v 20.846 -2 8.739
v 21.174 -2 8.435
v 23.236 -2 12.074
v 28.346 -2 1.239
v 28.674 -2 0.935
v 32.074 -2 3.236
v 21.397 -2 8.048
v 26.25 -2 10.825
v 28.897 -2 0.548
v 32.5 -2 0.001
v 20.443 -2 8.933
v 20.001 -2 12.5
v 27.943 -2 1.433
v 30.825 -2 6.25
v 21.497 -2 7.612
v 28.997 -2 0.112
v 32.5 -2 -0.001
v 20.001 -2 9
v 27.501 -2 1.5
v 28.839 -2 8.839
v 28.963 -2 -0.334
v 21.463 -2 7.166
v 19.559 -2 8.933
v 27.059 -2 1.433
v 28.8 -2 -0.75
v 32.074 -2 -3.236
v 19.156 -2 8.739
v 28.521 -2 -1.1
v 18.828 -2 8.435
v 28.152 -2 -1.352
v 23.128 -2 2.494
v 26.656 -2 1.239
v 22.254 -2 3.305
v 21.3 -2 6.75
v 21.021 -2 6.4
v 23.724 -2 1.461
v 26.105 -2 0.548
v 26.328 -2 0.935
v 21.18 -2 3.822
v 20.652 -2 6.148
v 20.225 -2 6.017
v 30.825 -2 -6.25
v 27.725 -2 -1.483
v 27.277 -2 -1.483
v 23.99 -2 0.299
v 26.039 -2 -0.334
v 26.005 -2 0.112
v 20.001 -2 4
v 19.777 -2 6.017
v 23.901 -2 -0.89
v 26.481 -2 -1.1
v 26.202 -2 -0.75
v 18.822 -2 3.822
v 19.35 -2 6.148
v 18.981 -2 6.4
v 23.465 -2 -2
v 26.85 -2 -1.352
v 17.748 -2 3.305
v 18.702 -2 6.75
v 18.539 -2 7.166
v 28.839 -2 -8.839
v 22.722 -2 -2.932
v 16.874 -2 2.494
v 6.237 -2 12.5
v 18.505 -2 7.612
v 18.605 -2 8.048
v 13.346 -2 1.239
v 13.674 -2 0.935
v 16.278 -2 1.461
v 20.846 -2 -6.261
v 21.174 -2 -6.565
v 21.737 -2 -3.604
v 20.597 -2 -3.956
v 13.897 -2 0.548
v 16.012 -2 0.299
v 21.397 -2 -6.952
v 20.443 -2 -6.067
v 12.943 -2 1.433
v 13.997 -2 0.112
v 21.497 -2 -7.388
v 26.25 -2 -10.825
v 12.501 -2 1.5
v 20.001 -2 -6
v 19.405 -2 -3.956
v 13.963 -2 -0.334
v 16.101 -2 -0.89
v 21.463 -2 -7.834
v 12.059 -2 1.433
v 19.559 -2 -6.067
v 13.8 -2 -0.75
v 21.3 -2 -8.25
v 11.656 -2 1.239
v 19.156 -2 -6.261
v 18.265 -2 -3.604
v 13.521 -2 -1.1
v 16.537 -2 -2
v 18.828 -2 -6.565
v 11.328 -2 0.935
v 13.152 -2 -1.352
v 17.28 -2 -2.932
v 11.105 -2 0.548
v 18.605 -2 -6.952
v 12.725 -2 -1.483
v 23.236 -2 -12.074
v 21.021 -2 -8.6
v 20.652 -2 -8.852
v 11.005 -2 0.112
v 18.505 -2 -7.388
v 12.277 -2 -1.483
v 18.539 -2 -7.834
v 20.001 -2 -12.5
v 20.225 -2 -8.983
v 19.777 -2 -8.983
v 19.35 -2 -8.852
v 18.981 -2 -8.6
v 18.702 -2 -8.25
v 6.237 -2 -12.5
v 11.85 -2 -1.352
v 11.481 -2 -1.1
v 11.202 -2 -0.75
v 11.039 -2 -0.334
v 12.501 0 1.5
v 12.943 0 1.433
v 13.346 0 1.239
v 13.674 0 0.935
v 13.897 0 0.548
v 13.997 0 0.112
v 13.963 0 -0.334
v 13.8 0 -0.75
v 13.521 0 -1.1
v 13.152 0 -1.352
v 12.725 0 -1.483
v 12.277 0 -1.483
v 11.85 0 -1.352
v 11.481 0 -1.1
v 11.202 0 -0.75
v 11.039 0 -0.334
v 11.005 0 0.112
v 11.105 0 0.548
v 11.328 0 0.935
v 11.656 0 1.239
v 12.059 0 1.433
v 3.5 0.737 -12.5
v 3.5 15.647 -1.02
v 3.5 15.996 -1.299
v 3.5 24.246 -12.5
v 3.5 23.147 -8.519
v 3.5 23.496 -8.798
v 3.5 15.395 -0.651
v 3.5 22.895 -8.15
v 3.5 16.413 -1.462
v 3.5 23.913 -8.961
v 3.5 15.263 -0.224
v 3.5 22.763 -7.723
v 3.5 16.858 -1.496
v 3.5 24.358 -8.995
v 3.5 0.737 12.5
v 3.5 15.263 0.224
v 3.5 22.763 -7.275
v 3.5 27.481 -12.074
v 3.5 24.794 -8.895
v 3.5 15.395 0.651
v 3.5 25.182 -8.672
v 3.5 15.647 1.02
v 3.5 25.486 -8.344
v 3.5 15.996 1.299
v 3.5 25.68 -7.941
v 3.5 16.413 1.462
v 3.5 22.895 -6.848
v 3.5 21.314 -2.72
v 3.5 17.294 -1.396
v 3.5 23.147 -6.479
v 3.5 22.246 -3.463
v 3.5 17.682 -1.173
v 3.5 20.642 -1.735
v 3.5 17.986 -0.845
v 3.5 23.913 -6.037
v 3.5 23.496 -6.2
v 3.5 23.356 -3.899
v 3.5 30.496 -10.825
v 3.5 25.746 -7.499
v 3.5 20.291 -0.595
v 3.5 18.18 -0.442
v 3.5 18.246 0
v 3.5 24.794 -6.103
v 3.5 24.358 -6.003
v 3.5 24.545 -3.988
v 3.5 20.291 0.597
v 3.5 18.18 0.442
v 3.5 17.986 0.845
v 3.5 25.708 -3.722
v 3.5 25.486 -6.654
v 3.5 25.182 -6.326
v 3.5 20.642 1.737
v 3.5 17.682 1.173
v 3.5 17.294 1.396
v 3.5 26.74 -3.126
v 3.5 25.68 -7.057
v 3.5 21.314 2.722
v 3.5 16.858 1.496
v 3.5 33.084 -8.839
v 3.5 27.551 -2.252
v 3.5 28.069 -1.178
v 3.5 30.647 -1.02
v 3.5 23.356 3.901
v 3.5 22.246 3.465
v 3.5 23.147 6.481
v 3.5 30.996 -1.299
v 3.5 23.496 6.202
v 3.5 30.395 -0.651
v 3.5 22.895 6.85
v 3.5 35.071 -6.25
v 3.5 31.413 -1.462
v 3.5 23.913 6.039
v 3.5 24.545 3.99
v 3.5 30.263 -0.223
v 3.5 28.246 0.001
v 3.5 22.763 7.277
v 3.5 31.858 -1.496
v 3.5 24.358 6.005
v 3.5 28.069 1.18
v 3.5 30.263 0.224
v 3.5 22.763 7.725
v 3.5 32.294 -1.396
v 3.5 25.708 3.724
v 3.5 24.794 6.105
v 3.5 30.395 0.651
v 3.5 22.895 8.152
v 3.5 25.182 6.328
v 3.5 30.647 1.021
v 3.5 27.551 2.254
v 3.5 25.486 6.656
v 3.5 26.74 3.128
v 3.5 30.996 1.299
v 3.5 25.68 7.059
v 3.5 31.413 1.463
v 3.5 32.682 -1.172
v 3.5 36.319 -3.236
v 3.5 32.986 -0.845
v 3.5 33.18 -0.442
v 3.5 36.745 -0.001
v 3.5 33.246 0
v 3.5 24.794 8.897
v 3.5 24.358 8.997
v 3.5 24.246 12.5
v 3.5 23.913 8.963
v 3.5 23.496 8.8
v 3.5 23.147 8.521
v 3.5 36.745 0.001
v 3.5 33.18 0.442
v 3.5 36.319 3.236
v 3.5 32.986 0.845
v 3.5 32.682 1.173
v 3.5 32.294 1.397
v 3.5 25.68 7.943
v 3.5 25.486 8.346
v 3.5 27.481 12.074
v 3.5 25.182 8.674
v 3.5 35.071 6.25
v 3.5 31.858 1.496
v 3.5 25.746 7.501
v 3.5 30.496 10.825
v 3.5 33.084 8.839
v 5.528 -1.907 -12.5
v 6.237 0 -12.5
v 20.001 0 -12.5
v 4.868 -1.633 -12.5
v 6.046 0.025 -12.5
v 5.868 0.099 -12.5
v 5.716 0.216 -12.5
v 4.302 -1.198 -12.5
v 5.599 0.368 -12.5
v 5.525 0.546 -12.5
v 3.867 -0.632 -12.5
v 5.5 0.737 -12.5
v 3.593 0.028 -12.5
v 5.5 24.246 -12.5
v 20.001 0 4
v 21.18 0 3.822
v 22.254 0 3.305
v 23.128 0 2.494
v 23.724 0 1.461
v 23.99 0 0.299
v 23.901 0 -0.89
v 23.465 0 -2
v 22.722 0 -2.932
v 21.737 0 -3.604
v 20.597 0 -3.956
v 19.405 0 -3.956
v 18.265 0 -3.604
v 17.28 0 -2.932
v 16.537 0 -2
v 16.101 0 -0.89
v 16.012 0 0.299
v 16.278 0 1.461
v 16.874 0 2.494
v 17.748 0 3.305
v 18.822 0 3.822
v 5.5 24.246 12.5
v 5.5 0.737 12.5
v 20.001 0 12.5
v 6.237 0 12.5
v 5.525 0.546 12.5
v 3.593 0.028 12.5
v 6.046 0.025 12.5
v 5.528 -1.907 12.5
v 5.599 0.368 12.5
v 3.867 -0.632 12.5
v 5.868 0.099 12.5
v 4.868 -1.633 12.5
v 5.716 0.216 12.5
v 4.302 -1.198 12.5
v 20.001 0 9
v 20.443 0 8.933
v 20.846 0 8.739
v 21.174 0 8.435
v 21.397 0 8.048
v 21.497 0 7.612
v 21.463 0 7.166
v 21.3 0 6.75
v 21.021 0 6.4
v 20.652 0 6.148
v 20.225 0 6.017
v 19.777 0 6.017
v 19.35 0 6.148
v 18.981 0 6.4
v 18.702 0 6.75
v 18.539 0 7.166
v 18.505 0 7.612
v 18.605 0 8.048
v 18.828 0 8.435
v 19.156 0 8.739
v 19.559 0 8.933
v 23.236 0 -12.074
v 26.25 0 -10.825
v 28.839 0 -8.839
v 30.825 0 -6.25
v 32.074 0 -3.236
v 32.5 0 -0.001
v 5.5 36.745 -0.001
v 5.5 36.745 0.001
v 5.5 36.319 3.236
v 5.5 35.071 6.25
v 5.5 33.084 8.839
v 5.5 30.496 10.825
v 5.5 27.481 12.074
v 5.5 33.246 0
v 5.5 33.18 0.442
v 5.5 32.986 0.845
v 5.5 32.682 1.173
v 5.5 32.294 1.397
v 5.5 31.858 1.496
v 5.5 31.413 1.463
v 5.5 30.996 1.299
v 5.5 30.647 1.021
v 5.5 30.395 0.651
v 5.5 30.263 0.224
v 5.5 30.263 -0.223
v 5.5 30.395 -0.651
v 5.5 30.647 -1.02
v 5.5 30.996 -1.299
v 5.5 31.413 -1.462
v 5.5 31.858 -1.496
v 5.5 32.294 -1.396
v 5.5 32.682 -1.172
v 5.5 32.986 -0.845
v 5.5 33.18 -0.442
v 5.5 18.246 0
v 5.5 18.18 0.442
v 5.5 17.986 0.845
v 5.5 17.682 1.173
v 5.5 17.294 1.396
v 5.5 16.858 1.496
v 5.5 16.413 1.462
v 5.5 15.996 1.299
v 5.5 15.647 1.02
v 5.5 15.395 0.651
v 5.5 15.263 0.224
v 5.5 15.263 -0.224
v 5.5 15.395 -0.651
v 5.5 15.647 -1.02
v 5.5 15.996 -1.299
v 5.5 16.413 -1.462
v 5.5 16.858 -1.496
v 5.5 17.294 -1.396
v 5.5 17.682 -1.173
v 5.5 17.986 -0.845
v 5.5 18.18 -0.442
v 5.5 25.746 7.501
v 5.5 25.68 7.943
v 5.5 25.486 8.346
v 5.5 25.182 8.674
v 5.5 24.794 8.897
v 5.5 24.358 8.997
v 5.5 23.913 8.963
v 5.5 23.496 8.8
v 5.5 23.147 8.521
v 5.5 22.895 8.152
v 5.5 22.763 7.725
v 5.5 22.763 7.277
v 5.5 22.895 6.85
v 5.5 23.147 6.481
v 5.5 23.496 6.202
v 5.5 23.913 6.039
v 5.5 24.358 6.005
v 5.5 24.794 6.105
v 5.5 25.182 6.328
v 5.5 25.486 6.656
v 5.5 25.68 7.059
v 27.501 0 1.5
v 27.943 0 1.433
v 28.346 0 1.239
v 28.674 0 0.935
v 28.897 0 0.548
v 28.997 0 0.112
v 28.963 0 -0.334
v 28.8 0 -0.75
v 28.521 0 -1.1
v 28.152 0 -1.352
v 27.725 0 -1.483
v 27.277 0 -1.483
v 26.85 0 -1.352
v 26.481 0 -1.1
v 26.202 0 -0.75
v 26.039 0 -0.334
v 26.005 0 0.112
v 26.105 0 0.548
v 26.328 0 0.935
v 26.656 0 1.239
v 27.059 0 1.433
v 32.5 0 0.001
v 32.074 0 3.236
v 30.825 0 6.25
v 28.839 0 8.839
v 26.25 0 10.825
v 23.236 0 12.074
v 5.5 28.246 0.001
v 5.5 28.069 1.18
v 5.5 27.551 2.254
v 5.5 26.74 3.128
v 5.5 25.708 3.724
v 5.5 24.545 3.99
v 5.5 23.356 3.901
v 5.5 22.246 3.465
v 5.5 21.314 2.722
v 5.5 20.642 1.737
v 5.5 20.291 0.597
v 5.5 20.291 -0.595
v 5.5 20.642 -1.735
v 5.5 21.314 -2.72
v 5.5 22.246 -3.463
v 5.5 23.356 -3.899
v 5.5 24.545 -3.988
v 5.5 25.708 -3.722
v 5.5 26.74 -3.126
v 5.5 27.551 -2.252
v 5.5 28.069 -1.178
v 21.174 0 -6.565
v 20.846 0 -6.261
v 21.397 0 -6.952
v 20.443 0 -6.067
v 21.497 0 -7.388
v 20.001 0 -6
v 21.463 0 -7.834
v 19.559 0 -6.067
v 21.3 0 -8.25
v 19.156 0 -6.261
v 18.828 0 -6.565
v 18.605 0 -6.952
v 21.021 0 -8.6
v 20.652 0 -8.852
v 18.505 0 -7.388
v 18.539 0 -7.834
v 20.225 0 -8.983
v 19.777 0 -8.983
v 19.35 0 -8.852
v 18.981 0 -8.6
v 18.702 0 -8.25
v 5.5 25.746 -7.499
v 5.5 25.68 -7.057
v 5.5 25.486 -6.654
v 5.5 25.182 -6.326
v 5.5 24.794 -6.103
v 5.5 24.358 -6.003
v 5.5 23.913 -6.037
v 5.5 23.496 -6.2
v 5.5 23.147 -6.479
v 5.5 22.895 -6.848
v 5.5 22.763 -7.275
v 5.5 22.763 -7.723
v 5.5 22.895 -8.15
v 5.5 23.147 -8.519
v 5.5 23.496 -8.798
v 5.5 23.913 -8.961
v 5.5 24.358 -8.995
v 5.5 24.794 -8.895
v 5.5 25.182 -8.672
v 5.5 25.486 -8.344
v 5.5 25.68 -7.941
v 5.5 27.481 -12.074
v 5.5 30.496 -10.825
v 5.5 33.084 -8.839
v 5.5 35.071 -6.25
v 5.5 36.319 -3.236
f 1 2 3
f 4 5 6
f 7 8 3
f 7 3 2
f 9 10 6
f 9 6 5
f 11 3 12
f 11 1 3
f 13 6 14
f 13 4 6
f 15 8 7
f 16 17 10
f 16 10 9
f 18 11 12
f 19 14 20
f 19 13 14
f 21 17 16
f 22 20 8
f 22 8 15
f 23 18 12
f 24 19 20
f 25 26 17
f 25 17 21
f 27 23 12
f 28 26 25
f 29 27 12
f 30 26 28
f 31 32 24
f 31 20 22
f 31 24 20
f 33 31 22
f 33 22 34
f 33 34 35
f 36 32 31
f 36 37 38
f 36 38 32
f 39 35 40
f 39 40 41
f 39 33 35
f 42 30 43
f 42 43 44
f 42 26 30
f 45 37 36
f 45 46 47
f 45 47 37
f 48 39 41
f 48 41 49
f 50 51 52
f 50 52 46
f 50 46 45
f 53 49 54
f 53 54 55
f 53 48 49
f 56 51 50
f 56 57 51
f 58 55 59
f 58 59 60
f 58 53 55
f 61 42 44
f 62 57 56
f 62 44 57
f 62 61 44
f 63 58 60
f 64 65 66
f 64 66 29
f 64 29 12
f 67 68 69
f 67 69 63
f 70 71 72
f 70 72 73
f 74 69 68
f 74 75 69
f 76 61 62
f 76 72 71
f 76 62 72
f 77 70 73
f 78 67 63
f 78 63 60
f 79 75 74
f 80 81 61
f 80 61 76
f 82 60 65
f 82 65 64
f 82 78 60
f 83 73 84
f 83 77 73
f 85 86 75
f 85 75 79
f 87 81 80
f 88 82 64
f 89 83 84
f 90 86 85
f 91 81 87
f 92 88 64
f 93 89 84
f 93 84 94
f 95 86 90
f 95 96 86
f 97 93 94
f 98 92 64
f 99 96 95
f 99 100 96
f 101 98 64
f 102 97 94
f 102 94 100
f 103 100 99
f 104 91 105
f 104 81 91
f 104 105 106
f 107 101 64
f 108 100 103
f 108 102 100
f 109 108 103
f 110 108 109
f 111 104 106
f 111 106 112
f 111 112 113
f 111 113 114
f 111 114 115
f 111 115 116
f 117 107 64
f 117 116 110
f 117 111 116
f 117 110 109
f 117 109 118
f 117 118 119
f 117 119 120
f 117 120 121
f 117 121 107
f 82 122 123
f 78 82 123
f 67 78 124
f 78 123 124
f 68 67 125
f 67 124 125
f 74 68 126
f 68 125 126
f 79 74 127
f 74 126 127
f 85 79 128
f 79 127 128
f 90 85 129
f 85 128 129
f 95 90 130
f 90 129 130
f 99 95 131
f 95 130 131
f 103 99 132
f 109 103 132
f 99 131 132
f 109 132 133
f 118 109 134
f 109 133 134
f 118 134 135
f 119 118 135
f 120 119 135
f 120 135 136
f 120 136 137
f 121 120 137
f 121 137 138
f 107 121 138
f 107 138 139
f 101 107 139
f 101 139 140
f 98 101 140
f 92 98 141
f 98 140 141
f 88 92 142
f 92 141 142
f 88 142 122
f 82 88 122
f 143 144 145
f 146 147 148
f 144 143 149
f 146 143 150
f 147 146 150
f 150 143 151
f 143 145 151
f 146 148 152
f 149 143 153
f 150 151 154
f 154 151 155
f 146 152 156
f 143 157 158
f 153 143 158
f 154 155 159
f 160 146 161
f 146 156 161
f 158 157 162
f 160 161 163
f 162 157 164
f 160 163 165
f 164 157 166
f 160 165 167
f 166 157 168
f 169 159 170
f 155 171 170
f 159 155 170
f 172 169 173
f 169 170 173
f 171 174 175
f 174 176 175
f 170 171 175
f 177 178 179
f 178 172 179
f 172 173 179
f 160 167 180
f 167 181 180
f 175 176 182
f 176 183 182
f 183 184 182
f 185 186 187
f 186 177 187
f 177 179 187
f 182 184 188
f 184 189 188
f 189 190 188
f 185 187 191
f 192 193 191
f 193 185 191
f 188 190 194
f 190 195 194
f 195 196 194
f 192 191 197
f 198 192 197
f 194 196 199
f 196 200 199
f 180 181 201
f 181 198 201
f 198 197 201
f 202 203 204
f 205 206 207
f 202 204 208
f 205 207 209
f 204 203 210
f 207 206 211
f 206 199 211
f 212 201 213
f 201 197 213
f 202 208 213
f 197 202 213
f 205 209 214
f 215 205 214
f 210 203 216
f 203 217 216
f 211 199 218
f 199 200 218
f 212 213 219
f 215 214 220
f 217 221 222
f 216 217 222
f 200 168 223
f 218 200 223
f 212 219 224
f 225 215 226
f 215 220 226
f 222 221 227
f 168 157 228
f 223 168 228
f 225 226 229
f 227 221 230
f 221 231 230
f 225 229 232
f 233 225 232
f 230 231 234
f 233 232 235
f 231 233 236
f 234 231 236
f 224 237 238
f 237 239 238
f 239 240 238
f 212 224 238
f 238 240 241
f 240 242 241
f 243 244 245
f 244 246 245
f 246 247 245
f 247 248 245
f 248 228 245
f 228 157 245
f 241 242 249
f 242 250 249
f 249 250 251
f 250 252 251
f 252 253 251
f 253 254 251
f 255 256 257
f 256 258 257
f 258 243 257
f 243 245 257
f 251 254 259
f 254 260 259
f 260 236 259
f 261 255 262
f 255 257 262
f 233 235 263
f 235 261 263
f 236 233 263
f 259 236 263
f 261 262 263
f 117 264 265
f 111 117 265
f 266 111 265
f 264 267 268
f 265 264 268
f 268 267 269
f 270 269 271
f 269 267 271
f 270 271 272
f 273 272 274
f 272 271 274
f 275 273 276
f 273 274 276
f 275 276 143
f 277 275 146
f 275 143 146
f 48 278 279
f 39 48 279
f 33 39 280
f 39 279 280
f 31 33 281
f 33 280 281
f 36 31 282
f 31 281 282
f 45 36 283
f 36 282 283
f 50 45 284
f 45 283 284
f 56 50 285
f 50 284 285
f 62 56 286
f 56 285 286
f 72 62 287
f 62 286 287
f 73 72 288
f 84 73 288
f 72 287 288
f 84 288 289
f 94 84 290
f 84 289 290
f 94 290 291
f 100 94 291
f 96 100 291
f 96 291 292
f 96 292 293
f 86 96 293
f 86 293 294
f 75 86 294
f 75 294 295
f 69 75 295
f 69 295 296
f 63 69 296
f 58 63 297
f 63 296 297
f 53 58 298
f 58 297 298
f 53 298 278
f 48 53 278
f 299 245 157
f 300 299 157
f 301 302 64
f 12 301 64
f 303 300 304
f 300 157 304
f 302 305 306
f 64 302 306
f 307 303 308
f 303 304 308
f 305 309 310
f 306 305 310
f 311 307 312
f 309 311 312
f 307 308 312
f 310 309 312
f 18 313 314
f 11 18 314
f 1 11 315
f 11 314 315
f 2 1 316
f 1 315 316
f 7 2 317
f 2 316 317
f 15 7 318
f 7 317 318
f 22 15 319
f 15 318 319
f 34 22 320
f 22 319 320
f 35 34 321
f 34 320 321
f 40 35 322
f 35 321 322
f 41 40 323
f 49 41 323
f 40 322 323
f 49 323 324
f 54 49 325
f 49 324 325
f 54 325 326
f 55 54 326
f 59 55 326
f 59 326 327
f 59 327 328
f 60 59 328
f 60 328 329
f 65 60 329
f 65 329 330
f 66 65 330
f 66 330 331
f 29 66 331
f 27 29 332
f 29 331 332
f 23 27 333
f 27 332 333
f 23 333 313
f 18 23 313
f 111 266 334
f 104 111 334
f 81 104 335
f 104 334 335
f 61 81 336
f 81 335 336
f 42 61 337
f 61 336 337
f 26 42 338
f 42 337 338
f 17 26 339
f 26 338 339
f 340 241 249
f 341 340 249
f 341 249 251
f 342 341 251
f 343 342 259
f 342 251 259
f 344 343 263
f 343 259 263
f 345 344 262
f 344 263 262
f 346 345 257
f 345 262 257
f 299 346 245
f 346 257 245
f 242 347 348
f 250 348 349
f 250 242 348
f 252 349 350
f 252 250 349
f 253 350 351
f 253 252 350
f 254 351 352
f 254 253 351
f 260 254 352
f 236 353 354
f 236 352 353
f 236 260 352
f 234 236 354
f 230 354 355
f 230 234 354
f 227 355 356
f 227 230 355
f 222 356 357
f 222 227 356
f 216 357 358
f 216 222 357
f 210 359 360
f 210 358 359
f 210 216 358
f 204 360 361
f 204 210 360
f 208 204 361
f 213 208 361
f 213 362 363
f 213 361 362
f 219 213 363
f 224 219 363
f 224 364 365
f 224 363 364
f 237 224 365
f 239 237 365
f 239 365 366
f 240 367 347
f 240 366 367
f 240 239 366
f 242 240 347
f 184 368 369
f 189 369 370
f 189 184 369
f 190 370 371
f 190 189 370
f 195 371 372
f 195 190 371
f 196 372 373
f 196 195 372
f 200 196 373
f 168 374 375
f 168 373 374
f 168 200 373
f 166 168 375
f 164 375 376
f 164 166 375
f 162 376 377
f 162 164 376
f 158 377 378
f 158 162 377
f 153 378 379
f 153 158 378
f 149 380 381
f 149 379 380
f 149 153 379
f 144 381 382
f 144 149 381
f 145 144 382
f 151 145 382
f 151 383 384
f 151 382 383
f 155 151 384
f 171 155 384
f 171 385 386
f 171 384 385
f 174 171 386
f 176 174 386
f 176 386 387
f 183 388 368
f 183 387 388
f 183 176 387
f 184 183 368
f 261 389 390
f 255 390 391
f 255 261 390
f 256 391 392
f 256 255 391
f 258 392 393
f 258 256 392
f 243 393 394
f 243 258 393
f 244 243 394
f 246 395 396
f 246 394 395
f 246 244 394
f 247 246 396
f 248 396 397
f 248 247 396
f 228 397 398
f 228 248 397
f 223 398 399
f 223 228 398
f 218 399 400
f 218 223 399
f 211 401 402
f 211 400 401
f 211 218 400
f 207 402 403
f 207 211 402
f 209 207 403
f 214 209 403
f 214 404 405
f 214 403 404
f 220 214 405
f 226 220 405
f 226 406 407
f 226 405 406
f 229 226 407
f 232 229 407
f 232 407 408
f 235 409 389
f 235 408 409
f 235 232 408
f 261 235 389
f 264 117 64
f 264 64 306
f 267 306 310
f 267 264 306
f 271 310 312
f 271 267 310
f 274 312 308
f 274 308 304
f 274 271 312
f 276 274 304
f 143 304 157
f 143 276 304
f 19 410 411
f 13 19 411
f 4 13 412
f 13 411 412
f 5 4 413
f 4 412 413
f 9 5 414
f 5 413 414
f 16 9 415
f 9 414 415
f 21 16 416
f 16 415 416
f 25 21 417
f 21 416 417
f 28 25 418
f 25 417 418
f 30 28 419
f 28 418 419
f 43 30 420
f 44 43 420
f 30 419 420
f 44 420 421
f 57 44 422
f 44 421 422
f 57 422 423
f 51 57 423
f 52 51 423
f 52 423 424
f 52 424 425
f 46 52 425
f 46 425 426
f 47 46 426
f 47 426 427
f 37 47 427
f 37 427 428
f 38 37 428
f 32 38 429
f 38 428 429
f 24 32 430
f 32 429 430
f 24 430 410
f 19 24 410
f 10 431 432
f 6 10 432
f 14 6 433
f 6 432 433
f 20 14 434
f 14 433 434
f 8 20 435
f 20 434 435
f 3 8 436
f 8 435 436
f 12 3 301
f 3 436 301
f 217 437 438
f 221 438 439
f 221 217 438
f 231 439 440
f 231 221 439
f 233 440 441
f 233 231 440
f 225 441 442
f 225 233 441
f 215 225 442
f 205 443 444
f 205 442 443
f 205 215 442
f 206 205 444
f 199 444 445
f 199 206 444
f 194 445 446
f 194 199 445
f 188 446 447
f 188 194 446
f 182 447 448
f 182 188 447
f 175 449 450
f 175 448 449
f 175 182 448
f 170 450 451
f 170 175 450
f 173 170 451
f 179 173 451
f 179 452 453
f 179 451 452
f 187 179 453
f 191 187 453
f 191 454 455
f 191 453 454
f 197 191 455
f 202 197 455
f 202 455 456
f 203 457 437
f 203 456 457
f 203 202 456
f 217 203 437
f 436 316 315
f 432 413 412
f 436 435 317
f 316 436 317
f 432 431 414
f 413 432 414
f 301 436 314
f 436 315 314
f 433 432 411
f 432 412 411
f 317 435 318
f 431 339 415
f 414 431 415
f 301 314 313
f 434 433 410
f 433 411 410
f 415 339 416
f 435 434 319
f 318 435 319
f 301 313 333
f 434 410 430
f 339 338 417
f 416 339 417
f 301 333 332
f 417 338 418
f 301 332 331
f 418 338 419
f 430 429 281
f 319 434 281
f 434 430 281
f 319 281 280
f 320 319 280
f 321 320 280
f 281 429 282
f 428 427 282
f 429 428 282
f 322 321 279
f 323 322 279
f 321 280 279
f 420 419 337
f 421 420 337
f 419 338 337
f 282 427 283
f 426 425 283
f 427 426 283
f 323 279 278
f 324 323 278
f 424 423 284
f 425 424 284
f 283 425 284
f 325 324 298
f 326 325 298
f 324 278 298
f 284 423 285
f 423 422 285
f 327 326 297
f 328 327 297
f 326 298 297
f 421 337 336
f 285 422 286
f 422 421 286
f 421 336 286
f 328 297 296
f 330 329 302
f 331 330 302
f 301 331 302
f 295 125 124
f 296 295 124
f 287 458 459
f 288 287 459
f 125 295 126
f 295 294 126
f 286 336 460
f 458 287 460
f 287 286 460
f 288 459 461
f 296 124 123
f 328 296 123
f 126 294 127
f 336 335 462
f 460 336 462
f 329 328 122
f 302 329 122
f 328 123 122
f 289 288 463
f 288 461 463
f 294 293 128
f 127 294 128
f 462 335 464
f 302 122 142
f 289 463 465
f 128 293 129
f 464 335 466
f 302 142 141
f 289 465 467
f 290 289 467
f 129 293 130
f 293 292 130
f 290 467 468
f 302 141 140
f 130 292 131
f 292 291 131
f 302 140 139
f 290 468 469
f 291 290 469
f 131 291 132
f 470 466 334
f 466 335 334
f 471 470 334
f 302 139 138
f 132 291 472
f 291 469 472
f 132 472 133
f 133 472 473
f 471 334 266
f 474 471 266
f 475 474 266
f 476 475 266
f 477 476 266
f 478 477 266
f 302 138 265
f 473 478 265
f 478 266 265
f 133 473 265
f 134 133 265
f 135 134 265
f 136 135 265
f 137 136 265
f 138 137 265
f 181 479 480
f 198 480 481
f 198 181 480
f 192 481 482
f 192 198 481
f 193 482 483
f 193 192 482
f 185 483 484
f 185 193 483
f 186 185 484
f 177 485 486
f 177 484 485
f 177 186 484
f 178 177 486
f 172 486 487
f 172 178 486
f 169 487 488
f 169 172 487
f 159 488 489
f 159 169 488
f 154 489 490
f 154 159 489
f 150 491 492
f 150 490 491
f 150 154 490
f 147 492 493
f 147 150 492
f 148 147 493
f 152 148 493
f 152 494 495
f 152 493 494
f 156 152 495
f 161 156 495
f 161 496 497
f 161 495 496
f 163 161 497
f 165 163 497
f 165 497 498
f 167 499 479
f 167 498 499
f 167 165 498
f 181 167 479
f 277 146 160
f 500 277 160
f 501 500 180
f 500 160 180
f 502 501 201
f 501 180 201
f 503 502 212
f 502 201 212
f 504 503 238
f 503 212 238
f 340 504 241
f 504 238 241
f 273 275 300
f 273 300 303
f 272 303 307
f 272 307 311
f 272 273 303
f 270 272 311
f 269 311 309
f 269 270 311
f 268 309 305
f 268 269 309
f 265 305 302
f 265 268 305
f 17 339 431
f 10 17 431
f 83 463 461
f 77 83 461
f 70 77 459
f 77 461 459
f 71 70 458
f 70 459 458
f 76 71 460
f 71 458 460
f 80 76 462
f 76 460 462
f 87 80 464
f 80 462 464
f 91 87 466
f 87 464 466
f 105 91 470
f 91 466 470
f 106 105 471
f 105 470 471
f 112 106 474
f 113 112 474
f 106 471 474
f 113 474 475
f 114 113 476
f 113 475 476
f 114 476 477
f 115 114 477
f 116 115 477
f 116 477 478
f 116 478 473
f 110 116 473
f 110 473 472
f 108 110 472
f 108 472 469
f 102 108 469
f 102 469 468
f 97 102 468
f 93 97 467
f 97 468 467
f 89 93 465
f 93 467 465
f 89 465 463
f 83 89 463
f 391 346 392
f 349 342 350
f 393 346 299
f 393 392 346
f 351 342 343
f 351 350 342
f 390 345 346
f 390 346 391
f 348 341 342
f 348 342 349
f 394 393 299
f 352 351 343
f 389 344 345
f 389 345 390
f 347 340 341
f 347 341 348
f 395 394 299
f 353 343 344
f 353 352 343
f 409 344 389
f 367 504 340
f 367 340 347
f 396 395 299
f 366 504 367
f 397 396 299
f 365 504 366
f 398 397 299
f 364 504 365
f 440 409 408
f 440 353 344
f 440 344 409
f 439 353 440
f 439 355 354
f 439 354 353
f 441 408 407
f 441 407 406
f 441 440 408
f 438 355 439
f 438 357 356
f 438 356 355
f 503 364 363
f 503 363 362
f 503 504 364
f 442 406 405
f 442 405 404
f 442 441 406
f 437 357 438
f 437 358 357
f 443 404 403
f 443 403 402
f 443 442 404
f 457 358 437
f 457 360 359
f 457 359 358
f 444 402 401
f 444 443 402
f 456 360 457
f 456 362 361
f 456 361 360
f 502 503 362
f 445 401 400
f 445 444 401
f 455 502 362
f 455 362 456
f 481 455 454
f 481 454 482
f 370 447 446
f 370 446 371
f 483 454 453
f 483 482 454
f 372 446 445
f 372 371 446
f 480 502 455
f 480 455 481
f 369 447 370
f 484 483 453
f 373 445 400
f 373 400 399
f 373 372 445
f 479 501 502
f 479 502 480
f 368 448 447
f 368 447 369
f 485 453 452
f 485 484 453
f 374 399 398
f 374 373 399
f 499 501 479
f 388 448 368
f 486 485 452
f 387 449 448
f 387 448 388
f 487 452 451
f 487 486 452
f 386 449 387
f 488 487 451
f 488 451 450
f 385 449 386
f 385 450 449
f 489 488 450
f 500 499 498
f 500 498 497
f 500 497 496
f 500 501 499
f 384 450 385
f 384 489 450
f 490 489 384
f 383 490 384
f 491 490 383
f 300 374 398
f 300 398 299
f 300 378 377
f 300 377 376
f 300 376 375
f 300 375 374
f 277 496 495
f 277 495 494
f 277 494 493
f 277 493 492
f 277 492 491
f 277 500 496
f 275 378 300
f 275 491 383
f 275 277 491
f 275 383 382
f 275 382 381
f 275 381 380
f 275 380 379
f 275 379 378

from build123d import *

# Parameters (mm, degrees)
SKETCH1_R                    = 1.5
SKETCH1_R_2                  = 4
BASE_FLANGE1_DEPTH           = 2
SKETCHED_START               = -32.5
SKETCHED_BEND1_OUTLINE_W     = 2
SKETCHED_BEND1_OUTLINE_H     = 25
SKETCHED_BEND1_DEPTH         = 36
SKETCHED_START_2             = 3.766161716
SKETCHED_BEND1_2_OUTLINE_R   = 1.5
SKETCHED_BEND1_2_OUTLINE_R_2 = 4
SKETCHED_BEND1_2_DEPTH       = 1.733838284
SKETCHED_START_3             = 3.5
SKETCHED_BEND1_3_OUTLINE_R   = 1.5
SKETCHED_BEND1_3_OUTLINE_R_2 = 4
SKETCHED_BEND1_3_DEPTH       = 2.7366
SKETCHED_START_4             = -12.5
SKETCHED_BEND1_4_DEPTH       = 25


with BuildPart() as part:
    # Base-Flange1: sheet metal written as solids
    # Sketch1 → Base-Flange1 (new body)
    with BuildSketch(Plane(origin=(0, 0, 0), x_dir=(1, 0, 0), z_dir=(0, 1, 0))):
        with BuildLine():
            Line((-32.5, -0.001), (-32.5, 0.001))
            ThreePointArc((-32.5, 0.001), (-28.839127658, 8.839127658), (-20.001, 12.5))
            Line((-20.001, 12.5), (20.001, 12.5))
            ThreePointArc((20.001, 12.5), (28.839127658, 8.839127658), (32.5, 0.001))
            Line((32.5, 0.001), (32.5, -0.001))
            ThreePointArc((32.5, -0.001), (28.839127658, -8.839127658), (20.001, -12.5))
            Line((20.001, -12.5), (-20.001, -12.5))
            ThreePointArc((-20.001, -12.5), (-28.839127658, -8.839127658), (-32.5, -0.001))
        make_face()
        with Locations(Location((12.501, 0.000250009, 0), (0, 0, 270))):
            Circle(SKETCH1_R, mode=Mode.SUBTRACT)
        with Locations(Location((20.001, 0.000250009, 0), (0, 0, 270))):
            Circle(SKETCH1_R_2, mode=Mode.SUBTRACT)
        with Locations(Location((20.001, -7.499749991, 0), (0, 0, 270))):
            Circle(SKETCH1_R, mode=Mode.SUBTRACT)
        with Locations(Location((27.501, 0.000250009, 0), (0, 0, 270))):
            Circle(SKETCH1_R, mode=Mode.SUBTRACT)
        with Locations(Location((20.001, 7.500250009, 0), (0, 0, 270))):
            Circle(SKETCH1_R, mode=Mode.SUBTRACT)
        with Locations(Location((-20.001, 7.499, 0), (0, 0, 270))):
            Circle(SKETCH1_R, mode=Mode.SUBTRACT)
        with Locations(Location((-27.500999963, -0.000250009, 0), (0, 0, 270))):
            Circle(SKETCH1_R, mode=Mode.SUBTRACT)
        with Locations(Location((-12.501000067, 0, 0), (0, 0, 270))):
            Circle(SKETCH1_R, mode=Mode.SUBTRACT)
        with Locations(Location((-20.001, -7.501, 0), (0, 0, 270))):
            Circle(SKETCH1_R, mode=Mode.SUBTRACT)
        with Locations(Location((-20.001, -0.001, 0), (0, 0, 270))):
            Circle(SKETCH1_R_2, mode=Mode.SUBTRACT)
    extrude(amount=-BASE_FLANGE1_DEPTH)

    # Sketched Bend1: read off the stored shape, not the designer's step
    # Sketched Bend1 outline → Sketched Bend1 (cut)
    with BuildSketch(Plane.YZ.offset(SKETCHED_START)):
        with Locations((-1, 0)):
            Rectangle(SKETCHED_BEND1_OUTLINE_W, SKETCHED_BEND1_OUTLINE_H)
    extrude(amount=SKETCHED_BEND1_DEPTH, mode=Mode.SUBTRACT)

    # Sketched Bend1 2 outline → Sketched Bend1 2 (add)
    with BuildSketch(Plane.YZ.offset(SKETCHED_START_2)):
        with BuildLine():
            ThreePointArc((36.745355099, 0.001), (33.084482757, 8.839127658), (24.246355099, 12.5))
            Line((24.246355099, 12.5), (0, 12.5))
            Line((0, 12.5), (0, -12.5))
            Line((0, -12.5), (24.246355099, -12.5))
            ThreePointArc((24.246355099, -12.5), (33.084482757, -8.839127658), (36.745355099, -0.001))
            Line((36.745355099, -0.001), (36.745355099, 0.001))
        make_face()
        with Locations((24.246355099, -7.499)):
            Circle(SKETCHED_BEND1_2_OUTLINE_R, mode=Mode.SUBTRACT)
        with Locations((16.746355166, 0)):
            Circle(SKETCHED_BEND1_2_OUTLINE_R, mode=Mode.SUBTRACT)
        with Locations((24.246355099, 0.001)):
            Circle(SKETCHED_BEND1_2_OUTLINE_R_2, mode=Mode.SUBTRACT)
        with Locations((31.746355061, 0.000250009)):
            Circle(SKETCHED_BEND1_2_OUTLINE_R, mode=Mode.SUBTRACT)
        with Locations((24.246355099, 7.501)):
            Circle(SKETCHED_BEND1_2_OUTLINE_R, mode=Mode.SUBTRACT)
    extrude(amount=SKETCHED_BEND1_2_DEPTH)

    # Sketched Bend1 3 outline → Sketched Bend1 3 (add)
    with BuildSketch(Plane.YZ.offset(SKETCHED_START_3)):
        with BuildLine():
            ThreePointArc((36.745355099, 0.001), (33.084482757, 8.839127658), (24.246355099, 12.5))
            Line((24.246355099, 12.5), (0, 12.5))
            Line((0, 12.5), (0, -12.5))
            Line((0, -12.5), (24.246355099, -12.5))
            ThreePointArc((24.246355099, -12.5), (33.084482757, -8.839127658), (36.745355099, -0.001))
            Line((36.745355099, -0.001), (36.745355099, 0.001))
        make_face()
        with Locations((24.246355099, -7.499)):
            Circle(SKETCHED_BEND1_3_OUTLINE_R, mode=Mode.SUBTRACT)
        with Locations((16.746355166, 0)):
            Circle(SKETCHED_BEND1_3_OUTLINE_R, mode=Mode.SUBTRACT)
        with Locations((24.246355099, 0.001)):
            Circle(SKETCHED_BEND1_3_OUTLINE_R_2, mode=Mode.SUBTRACT)
        with Locations((31.746355061, 0.000250009)):
            Circle(SKETCHED_BEND1_3_OUTLINE_R, mode=Mode.SUBTRACT)
        with Locations((24.246355099, 7.501)):
            Circle(SKETCHED_BEND1_3_OUTLINE_R, mode=Mode.SUBTRACT)
    extrude(amount=SKETCHED_BEND1_3_DEPTH)

    # Sketched Bend1 4 outline → Sketched Bend1 4 (cut)
    with BuildSketch(Plane.XY.offset(SKETCHED_START_4)):
        with BuildLine():
            ThreePointArc((6.2366, -2), (4.301531583, -1.198468417), (3.5, 0.7366))
            Line((3.5, 0.7366), (3.5, -2))
            Line((3.5, -2), (6.2366, -2))
        make_face()
        with BuildLine():
            Line((5.5, 36.745355099), (5.5, 0.7366))
            ThreePointArc((5.5, 0.7366), (5.715745145, 0.215745145), (6.2366, 0))
            Line((6.2366, 0), (6.2366, 36.745355099))
            Line((6.2366, 36.745355099), (5.5, 36.745355099))
        make_face()
    extrude(amount=SKETCHED_BEND1_4_DEPTH, mode=Mode.SUBTRACT)


solid = part.part
